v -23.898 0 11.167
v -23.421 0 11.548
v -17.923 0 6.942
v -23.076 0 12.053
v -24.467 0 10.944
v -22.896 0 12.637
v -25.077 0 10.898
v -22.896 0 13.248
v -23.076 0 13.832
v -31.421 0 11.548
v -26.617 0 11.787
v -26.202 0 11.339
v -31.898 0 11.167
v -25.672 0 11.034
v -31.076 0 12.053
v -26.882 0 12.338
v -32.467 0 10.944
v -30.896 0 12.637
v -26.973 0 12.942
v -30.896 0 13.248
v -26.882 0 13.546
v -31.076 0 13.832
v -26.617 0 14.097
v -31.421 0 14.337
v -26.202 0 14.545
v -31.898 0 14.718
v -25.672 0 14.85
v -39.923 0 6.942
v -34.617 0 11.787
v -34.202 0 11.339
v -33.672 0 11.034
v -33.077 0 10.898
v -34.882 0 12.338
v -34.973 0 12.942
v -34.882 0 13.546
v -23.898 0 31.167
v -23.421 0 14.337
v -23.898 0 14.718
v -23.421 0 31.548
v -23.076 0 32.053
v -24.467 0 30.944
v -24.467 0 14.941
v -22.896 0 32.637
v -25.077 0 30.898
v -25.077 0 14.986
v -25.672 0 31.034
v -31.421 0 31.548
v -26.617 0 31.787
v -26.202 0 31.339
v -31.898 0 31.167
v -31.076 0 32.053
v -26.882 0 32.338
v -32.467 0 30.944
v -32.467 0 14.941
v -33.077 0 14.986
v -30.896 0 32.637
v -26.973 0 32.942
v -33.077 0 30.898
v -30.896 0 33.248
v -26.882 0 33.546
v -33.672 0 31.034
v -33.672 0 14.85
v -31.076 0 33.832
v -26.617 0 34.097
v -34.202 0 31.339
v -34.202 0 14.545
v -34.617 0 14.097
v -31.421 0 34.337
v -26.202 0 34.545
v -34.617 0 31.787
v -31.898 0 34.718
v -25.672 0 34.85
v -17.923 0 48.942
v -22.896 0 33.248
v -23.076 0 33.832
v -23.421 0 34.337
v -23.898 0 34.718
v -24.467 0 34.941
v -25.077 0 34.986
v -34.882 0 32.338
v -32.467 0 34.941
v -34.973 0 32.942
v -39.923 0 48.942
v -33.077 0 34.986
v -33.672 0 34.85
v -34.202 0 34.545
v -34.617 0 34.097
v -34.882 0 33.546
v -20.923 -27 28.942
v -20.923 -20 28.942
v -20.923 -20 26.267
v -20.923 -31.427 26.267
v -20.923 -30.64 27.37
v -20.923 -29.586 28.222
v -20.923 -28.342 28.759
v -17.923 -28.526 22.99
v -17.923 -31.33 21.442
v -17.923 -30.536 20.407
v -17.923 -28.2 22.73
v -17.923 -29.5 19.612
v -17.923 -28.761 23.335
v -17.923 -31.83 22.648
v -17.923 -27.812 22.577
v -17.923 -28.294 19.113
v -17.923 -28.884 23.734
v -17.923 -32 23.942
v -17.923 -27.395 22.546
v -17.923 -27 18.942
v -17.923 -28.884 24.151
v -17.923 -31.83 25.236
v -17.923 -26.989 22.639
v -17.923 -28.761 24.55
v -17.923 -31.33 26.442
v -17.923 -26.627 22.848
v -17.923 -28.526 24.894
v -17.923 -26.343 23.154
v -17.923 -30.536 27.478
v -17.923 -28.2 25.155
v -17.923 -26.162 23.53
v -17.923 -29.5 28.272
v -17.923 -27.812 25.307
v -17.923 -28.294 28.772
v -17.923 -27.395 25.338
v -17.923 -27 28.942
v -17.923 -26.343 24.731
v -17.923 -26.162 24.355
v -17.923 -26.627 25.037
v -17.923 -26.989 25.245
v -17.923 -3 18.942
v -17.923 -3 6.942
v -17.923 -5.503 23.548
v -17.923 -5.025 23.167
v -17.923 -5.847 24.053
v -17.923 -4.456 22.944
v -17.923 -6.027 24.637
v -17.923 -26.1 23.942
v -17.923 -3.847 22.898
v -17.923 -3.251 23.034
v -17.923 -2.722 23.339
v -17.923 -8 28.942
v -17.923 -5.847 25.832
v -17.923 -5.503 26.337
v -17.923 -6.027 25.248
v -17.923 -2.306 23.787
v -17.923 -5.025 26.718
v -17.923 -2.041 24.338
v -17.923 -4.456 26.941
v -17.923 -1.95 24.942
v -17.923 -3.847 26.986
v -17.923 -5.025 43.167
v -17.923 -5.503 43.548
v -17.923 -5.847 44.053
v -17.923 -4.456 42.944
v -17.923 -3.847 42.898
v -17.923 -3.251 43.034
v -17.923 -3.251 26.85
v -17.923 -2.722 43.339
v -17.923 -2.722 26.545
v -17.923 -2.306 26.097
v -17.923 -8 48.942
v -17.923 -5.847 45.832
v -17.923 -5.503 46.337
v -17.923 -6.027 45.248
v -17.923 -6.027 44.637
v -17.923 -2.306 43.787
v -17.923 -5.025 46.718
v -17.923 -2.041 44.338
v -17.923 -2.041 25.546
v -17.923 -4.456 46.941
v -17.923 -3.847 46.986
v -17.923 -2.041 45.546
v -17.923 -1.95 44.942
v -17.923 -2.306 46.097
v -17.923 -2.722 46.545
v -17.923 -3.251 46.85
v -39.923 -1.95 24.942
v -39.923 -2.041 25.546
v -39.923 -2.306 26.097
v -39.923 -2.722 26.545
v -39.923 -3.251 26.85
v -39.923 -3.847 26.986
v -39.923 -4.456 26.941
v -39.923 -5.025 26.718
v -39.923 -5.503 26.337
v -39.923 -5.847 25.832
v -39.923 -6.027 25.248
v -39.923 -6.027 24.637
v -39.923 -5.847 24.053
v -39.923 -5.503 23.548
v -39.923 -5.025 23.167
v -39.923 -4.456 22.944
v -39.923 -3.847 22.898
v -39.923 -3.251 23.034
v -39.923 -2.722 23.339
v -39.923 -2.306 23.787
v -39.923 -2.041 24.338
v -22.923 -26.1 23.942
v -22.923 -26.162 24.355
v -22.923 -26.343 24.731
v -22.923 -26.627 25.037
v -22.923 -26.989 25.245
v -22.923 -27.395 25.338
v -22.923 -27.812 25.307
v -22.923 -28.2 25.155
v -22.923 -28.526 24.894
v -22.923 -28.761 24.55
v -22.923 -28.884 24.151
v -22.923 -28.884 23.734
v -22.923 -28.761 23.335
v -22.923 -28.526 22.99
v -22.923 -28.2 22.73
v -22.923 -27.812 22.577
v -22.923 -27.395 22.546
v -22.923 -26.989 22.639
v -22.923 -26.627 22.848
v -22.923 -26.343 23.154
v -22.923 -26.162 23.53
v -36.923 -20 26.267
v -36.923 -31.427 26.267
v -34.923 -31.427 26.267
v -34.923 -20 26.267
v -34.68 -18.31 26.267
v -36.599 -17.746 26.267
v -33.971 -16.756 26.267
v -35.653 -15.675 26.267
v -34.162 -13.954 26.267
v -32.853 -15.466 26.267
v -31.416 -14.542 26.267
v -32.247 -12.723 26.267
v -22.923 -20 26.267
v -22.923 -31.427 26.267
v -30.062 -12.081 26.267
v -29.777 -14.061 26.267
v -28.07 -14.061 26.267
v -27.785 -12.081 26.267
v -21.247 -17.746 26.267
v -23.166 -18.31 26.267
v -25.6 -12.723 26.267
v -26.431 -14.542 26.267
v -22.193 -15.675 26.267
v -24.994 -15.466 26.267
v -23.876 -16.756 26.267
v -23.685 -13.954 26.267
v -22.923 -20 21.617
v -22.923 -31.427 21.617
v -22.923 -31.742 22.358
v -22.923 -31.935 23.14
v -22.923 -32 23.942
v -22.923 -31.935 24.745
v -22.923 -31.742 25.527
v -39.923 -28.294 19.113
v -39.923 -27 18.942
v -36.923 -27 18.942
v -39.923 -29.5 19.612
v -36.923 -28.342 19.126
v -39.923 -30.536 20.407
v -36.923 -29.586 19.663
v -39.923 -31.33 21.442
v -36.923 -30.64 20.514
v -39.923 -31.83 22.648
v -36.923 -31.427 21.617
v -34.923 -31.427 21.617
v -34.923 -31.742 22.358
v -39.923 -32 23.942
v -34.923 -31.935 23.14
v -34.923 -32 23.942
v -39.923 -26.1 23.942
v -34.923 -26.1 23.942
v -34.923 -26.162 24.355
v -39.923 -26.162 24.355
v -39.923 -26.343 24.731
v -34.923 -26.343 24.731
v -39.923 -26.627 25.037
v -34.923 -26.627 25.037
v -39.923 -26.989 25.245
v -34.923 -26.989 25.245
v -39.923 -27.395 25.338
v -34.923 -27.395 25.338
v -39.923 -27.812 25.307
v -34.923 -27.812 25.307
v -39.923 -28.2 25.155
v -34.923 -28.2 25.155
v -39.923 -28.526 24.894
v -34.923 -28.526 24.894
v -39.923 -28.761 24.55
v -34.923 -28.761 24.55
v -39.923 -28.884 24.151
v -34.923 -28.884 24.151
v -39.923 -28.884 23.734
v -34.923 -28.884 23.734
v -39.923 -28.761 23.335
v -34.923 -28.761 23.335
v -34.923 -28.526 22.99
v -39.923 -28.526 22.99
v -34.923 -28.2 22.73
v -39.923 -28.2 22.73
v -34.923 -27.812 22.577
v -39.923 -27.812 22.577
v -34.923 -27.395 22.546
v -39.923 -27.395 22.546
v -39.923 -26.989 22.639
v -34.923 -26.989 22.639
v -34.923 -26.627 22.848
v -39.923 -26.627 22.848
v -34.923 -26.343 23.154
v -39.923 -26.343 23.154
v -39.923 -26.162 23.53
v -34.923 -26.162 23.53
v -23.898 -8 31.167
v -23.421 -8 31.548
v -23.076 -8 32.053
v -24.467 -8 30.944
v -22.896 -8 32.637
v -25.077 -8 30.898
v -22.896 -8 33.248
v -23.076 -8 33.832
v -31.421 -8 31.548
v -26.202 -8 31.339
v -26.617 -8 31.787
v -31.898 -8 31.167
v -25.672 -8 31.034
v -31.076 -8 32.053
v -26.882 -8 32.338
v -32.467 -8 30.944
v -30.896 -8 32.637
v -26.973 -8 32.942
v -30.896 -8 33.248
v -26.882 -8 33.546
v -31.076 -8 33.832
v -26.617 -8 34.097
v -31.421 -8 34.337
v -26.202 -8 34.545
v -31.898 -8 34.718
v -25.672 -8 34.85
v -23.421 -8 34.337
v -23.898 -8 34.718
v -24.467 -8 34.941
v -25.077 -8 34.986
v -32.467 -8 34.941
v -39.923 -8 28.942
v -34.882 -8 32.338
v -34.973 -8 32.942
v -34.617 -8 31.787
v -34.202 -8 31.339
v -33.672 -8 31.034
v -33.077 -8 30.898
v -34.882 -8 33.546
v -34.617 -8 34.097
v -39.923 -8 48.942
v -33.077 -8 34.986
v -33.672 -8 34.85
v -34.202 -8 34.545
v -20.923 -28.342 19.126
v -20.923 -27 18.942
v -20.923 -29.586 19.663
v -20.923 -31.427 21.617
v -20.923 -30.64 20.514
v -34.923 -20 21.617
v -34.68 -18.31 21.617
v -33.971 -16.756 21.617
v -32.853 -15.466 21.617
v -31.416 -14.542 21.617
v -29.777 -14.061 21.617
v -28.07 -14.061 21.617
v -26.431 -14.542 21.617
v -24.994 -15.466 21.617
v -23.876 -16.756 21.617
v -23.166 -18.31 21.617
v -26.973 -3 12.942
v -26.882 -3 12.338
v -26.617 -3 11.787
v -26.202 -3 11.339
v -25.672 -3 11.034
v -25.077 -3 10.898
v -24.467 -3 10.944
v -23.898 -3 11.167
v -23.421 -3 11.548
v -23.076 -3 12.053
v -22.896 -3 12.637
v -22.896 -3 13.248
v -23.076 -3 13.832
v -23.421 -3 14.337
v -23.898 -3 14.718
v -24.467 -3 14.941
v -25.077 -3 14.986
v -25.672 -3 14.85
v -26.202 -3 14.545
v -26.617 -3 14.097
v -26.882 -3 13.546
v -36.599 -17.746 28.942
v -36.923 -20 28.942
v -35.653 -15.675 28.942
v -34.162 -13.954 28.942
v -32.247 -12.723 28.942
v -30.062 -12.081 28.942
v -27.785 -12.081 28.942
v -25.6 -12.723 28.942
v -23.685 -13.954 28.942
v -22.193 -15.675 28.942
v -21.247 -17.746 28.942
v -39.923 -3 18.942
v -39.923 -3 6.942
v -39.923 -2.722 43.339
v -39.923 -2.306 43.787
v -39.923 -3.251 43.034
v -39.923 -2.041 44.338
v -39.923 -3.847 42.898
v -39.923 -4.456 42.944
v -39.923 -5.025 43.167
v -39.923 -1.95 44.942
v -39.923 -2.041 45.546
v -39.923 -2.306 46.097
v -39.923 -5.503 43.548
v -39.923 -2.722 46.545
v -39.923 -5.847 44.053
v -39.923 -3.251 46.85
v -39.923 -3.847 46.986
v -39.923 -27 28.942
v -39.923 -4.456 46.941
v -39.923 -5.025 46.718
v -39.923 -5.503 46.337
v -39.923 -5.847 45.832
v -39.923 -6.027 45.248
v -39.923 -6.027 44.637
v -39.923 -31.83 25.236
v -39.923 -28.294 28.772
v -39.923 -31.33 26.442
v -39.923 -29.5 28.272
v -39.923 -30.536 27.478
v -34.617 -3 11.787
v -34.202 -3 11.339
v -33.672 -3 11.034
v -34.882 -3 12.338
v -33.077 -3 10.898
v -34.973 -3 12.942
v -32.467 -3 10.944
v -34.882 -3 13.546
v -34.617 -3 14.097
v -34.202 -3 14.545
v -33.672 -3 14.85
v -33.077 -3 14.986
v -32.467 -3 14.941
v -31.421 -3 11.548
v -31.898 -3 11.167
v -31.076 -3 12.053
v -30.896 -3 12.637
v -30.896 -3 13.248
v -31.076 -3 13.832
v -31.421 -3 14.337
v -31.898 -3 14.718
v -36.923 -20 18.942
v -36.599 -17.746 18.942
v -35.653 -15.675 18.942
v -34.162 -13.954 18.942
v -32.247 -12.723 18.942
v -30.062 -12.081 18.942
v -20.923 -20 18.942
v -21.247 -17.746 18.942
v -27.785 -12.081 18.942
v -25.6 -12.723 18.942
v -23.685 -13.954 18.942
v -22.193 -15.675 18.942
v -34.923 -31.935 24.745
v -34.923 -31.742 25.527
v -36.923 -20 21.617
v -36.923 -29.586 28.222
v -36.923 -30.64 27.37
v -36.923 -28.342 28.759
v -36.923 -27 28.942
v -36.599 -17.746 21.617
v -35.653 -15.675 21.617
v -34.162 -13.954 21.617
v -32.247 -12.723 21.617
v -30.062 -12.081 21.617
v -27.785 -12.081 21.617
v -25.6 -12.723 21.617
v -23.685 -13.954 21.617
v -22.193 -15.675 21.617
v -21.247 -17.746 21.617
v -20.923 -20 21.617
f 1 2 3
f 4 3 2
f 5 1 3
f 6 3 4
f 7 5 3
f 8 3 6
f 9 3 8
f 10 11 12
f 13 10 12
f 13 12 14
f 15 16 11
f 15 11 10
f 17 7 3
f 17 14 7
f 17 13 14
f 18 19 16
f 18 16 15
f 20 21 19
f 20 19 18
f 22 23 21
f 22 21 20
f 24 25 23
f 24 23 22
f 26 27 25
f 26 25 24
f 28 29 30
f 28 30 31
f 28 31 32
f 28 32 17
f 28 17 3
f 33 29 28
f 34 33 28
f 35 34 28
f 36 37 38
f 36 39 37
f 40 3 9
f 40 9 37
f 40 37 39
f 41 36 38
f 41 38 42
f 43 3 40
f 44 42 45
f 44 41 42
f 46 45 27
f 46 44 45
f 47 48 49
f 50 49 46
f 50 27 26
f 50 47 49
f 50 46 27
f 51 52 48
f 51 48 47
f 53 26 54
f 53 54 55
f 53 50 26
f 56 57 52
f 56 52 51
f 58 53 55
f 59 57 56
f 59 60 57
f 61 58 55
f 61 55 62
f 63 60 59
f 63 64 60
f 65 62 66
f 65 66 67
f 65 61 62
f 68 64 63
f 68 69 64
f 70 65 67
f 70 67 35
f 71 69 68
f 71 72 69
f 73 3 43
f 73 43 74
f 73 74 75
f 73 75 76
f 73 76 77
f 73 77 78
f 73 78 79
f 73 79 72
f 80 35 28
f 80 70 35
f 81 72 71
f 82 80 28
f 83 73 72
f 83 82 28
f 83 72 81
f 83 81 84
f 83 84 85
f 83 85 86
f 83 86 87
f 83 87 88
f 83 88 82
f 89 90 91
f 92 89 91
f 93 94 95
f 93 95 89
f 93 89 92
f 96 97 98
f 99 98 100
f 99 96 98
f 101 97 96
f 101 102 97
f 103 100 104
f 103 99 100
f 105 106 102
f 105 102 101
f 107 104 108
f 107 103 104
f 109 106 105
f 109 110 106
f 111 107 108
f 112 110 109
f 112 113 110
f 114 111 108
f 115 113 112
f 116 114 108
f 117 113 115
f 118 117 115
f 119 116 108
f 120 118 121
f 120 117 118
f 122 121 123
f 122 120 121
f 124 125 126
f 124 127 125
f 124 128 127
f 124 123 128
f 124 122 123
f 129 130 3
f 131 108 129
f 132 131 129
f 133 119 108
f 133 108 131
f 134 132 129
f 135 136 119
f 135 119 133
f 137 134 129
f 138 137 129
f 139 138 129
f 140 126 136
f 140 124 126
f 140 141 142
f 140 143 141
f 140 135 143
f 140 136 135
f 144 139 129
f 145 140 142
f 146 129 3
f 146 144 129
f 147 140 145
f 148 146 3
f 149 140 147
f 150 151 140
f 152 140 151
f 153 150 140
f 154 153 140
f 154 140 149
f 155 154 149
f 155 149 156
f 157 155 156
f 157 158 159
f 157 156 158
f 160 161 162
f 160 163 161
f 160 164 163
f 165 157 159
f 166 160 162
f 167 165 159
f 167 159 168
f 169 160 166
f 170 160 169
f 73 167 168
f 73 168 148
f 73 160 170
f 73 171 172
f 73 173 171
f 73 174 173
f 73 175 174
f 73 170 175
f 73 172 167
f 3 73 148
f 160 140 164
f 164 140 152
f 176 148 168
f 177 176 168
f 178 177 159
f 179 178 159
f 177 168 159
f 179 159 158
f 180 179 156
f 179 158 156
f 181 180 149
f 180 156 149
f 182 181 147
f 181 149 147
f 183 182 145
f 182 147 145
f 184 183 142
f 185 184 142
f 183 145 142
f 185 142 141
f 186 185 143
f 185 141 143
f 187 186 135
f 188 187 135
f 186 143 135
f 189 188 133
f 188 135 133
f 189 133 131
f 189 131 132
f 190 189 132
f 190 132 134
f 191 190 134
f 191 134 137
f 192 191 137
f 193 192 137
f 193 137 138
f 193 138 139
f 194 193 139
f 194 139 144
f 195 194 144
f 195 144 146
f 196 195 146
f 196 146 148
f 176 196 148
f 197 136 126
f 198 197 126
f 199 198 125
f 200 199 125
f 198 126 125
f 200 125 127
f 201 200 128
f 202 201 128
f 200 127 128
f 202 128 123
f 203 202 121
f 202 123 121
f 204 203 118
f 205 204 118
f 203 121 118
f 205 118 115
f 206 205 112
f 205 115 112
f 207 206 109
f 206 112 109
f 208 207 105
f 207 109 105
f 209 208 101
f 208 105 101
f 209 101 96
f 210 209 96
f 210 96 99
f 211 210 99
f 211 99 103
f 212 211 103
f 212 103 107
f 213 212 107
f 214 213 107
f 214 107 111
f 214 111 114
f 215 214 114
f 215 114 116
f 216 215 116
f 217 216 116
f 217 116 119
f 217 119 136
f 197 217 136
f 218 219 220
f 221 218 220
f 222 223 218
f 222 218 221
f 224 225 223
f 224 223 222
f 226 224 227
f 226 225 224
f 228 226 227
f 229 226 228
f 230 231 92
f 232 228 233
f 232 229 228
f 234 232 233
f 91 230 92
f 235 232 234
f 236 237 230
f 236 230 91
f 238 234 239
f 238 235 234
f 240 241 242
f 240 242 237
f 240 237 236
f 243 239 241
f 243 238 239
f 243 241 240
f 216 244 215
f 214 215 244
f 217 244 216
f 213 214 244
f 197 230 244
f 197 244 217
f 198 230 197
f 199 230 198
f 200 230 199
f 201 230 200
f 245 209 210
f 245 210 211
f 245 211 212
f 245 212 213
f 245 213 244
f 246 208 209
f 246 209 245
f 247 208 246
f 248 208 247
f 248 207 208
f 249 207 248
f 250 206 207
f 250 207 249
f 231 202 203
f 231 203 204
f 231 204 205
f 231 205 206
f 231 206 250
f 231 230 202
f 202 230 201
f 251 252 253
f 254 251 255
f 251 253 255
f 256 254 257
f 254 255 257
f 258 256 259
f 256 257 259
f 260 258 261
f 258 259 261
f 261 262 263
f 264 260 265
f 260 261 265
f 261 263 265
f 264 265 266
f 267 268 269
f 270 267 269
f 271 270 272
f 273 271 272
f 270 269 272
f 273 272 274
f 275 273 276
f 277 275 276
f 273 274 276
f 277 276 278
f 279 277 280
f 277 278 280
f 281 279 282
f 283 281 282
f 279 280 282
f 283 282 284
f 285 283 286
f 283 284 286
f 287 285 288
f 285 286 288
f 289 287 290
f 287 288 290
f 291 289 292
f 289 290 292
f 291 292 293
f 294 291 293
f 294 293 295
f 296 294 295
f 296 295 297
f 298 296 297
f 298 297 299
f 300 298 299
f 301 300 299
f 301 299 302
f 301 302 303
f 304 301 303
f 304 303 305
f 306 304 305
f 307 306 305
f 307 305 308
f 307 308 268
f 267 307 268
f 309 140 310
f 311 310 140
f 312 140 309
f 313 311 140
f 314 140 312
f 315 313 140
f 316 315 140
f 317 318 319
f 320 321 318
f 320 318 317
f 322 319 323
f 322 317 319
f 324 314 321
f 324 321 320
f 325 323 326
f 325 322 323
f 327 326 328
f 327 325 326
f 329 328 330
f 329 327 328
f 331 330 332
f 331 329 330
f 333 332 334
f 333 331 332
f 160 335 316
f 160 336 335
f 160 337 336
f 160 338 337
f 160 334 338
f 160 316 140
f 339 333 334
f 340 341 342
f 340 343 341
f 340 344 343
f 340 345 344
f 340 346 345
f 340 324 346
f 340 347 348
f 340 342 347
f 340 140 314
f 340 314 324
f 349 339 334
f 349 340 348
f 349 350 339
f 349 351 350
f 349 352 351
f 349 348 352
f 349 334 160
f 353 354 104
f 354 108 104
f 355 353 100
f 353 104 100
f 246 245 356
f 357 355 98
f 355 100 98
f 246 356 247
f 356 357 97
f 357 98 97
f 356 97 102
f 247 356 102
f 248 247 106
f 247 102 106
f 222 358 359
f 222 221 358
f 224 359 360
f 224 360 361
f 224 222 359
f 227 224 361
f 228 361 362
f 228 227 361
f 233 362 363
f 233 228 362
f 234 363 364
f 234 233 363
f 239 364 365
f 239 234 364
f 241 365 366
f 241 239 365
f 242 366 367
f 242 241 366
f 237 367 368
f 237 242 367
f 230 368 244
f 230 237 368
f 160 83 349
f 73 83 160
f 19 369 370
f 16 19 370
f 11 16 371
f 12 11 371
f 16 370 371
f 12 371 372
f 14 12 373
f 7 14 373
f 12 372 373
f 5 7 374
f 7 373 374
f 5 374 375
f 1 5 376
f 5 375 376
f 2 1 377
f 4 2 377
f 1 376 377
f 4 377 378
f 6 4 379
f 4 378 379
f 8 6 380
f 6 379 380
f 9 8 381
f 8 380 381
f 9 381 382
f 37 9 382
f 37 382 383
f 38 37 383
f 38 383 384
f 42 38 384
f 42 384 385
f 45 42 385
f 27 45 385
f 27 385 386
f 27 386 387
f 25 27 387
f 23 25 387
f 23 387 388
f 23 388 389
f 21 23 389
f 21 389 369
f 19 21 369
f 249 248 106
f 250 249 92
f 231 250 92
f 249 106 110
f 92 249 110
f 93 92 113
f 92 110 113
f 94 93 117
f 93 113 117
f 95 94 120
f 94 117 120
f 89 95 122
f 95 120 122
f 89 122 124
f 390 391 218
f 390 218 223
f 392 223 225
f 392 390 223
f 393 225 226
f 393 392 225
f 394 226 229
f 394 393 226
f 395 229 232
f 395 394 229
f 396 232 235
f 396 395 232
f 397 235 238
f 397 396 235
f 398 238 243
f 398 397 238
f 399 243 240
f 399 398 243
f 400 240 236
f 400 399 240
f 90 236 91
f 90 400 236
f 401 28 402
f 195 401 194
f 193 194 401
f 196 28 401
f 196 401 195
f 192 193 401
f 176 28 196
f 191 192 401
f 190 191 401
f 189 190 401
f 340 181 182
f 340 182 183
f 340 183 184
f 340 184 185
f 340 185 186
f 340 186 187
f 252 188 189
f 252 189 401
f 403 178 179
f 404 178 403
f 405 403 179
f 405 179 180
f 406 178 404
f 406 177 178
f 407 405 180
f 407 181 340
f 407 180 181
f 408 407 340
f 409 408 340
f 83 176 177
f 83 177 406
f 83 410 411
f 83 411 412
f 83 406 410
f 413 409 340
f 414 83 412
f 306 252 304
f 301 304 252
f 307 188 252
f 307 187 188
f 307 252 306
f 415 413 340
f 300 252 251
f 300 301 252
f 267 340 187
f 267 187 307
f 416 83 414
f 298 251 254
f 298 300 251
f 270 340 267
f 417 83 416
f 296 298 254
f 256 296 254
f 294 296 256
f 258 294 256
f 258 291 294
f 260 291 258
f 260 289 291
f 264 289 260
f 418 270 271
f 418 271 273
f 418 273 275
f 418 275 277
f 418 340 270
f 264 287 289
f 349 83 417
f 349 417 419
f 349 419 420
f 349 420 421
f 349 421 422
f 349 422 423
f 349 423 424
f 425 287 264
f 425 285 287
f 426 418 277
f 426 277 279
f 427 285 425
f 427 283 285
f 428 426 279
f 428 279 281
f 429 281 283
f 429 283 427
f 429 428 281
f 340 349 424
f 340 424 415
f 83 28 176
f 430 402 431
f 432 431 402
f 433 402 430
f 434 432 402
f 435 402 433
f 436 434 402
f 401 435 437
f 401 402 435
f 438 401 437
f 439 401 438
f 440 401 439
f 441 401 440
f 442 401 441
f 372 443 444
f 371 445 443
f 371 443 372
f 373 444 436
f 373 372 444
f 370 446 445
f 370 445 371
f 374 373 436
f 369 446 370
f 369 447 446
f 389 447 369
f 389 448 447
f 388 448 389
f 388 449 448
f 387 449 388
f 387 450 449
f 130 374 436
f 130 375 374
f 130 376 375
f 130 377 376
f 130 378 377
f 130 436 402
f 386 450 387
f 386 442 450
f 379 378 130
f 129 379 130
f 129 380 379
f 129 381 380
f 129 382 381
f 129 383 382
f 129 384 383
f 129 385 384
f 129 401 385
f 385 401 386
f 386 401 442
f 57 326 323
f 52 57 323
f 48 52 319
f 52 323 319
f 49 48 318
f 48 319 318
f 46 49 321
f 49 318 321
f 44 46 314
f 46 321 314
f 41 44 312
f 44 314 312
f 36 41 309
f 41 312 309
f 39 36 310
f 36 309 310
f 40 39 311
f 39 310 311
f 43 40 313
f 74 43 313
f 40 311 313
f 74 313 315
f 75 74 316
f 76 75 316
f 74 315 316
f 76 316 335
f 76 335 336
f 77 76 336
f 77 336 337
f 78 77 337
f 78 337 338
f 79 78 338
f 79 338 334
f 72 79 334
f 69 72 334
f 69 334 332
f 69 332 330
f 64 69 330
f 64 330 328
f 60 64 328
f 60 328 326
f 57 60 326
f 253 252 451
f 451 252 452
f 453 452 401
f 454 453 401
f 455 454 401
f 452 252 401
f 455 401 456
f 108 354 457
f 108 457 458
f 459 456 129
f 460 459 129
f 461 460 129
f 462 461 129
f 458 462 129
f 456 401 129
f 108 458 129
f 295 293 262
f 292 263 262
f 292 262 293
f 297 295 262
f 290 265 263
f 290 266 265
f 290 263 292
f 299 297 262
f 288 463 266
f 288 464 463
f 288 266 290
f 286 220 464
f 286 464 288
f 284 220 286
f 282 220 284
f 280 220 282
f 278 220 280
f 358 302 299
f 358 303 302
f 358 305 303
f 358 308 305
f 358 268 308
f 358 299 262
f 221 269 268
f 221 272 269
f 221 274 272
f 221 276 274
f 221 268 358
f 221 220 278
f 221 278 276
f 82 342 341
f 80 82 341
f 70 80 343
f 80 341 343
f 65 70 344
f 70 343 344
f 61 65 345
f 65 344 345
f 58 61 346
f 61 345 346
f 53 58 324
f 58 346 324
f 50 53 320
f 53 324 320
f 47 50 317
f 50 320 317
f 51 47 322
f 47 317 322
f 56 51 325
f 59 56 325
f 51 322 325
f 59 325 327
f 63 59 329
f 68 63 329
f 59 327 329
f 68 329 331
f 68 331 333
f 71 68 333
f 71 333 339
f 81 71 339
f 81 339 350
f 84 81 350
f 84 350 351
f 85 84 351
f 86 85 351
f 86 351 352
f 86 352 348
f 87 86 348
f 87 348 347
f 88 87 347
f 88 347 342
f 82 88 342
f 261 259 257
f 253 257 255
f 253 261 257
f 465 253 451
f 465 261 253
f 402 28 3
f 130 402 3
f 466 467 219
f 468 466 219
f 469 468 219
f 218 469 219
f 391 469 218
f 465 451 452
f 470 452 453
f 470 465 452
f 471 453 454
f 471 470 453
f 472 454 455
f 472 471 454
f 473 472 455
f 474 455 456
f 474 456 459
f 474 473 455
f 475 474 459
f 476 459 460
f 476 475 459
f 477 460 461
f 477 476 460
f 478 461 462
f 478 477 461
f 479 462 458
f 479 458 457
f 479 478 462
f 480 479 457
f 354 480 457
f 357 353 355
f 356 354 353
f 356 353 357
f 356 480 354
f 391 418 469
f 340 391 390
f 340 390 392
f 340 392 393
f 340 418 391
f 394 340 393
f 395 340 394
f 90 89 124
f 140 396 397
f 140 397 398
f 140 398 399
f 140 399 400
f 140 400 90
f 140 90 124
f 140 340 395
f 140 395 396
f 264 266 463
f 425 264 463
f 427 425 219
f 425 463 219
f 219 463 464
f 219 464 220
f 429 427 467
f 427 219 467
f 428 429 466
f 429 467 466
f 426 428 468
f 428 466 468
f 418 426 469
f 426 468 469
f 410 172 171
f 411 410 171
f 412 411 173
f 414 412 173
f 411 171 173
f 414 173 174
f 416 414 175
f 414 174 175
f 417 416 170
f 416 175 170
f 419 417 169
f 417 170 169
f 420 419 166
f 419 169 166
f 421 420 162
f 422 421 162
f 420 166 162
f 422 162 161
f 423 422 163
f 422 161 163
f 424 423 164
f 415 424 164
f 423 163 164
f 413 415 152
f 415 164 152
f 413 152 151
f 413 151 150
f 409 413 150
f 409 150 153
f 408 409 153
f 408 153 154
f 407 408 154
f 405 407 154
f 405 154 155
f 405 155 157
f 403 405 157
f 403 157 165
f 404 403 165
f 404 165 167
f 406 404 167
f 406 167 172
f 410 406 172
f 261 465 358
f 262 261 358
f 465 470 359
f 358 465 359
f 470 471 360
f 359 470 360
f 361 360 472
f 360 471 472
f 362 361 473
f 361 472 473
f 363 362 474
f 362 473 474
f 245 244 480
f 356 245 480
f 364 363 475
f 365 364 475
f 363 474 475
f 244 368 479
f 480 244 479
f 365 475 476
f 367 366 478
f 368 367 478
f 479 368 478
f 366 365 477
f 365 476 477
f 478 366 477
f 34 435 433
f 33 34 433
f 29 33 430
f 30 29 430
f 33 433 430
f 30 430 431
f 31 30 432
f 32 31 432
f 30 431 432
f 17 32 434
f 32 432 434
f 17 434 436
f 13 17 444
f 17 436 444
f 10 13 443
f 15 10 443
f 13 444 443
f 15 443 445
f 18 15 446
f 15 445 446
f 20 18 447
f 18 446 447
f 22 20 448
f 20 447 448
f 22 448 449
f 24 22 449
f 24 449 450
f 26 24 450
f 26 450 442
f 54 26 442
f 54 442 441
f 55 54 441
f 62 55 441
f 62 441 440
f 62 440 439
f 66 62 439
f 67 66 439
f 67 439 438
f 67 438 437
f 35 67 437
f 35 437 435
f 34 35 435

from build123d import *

# Parameters (mm, degrees)
F0_W     = 22
F0_H     = 42
F1_DEPTH = 3
F2_W     = 3
F2_H     = 30
F2_W_2   = 5
F3_DEPTH = 22
F4_D     = 4.1
F7_DEPTH = 5
F8_DEPTH = 2.325
F9_R     = 4.99999
F11_D    = 4.1
F12_D    = 2.8


# Not quite as in the source:
# - a fillet or chamfer is up to 0.001 mm smaller than in the source, because OpenCascade refuses the exact size


with BuildPart() as f1:
    # F0 (on Front) → F1 (new body)
    with BuildSketch(Plane.XZ):
        with Locations((-28.9233987555, 27.9422005266)):
            Rectangle(F0_W, F0_H)
    extrude(amount=F1_DEPTH)

    # F2 (on face) → F3 (join)
    with BuildSketch(Plane(origin=(-39.9233987555, 0, 0), x_dir=(0, -1, 0), z_dir=(-1, 0, 0))):
        with Locations((1.5, 33.9422005266)):
            Rectangle(F2_W, F2_H)
        with Locations((5.5, 33.9422005266)):
            Rectangle(F2_W_2, F2_H)
    extrude(amount=-F3_DEPTH)

    # F4 (through all)
    with Locations(Plane(origin=(0, 0, 0), x_dir=(1, 0, 0), z_dir=(0, 1, 0))):
        with Locations((-24.9233987555, -12.9422005266), (-32.9233987555, -12.9422005266), (-32.9233987555, -32.9422005266), (-24.9233987555, -32.9422005266)):
            Hole(F4_D / 2)

    # F6 (on line) → F7 (join, symmetric)
    with BuildSketch(Plane.XY.offset(23.9422005266)):
        with BuildLine():
            ThreePointArc((-36.9233987555, -20), (-28.9233987555, -12), (-20.9233987555, -20))
            Line((-20.9233987555, -20), (-20.9233987555, -32))
            Line((-20.9233987555, -32), (-17.9233987555, -32))
            Line((-17.9233987555, -32), (-17.9233987555, 0))
            Line((-17.9233987555, 0), (-39.9233987555, 0))
            Line((-39.9233987555, 0), (-39.9233987555, -32))
            Line((-39.9233987555, -32), (-36.9233987555, -32))
            Line((-36.9233987555, -32), (-36.9233987555, -20))
        make_face()
    extrude(amount=F7_DEPTH, both=True)

    # F6 (on line) → F8 (join, symmetric)
    with BuildSketch(Plane.XY.offset(23.9422005266)):
        with BuildLine():
            ThreePointArc((-34.9233987555, -20), (-28.9233987555, -14), (-22.9233987555, -20))
            Line((-22.9233987555, -20), (-22.9233987555, -25.2915026221))
            ThreePointArc((-22.9233987555, -25.2915026221), (-21.4400839819, -22.8284271247), (-20.9233987555, -20))
            ThreePointArc((-20.9233987555, -20), (-28.9233987555, -12), (-36.9233987555, -20))
            ThreePointArc((-36.9233987555, -20), (-36.406713529, -22.8284271247), (-34.9233987555, -25.2915026221))
            Line((-34.9233987555, -25.2915026221), (-34.9233987555, -20))
        make_face()
        with BuildLine():
            Line((-34.9233987555, -32), (-34.9233987555, -25.2915026221))
            ThreePointArc((-34.9233987555, -25.2915026221), (-36.406713529, -22.8284271247), (-36.9233987555, -20))
            Line((-36.9233987555, -20), (-36.9233987555, -32))
            Line((-36.9233987555, -32), (-34.9233987555, -32))
        make_face()
        with BuildLine():
            ThreePointArc((-20.9233987555, -20), (-21.4400839819, -22.8284271247), (-22.9233987555, -25.2915026221))
            Line((-22.9233987555, -25.2915026221), (-22.9233987555, -32))
            Line((-22.9233987555, -32), (-20.9233987555, -32))
            Line((-20.9233987555, -32), (-20.9233987555, -20))
        make_face()
    extrude(amount=F8_DEPTH, both=True)

    # F9 (radius 5 in the source; OpenCascade refuses exactly that, so slightly less here)
    f9_edges = [f1.edges().sort_by_distance(p)[0] for p in [
        (-38.423399, -32, 28.942201),
        (-38.423399, -32, 18.942201),
        (-19.423399, -32, 18.942201),
        (-19.423399, -32, 28.942201),
    ]]
    fillet(f9_edges, radius=F9_R)

    # F11 (through all)
    with Locations(Plane(origin=(-39.9233987555, 0, 0), x_dir=(0, -1, 0), z_dir=(-1, 0, 0))):
        with Locations((4, 44.9422005266), (4, 24.9422005266)):
            Hole(F11_D / 2)

    # F12 (through all)
    with Locations(Plane(origin=(-39.9233987555, 0, 0), x_dir=(0, -1, 0), z_dir=(-1, 0, 0))):
        with Locations((27.5, 23.9422005266)):
            Hole(F12_D / 2)


solid = f1.part
